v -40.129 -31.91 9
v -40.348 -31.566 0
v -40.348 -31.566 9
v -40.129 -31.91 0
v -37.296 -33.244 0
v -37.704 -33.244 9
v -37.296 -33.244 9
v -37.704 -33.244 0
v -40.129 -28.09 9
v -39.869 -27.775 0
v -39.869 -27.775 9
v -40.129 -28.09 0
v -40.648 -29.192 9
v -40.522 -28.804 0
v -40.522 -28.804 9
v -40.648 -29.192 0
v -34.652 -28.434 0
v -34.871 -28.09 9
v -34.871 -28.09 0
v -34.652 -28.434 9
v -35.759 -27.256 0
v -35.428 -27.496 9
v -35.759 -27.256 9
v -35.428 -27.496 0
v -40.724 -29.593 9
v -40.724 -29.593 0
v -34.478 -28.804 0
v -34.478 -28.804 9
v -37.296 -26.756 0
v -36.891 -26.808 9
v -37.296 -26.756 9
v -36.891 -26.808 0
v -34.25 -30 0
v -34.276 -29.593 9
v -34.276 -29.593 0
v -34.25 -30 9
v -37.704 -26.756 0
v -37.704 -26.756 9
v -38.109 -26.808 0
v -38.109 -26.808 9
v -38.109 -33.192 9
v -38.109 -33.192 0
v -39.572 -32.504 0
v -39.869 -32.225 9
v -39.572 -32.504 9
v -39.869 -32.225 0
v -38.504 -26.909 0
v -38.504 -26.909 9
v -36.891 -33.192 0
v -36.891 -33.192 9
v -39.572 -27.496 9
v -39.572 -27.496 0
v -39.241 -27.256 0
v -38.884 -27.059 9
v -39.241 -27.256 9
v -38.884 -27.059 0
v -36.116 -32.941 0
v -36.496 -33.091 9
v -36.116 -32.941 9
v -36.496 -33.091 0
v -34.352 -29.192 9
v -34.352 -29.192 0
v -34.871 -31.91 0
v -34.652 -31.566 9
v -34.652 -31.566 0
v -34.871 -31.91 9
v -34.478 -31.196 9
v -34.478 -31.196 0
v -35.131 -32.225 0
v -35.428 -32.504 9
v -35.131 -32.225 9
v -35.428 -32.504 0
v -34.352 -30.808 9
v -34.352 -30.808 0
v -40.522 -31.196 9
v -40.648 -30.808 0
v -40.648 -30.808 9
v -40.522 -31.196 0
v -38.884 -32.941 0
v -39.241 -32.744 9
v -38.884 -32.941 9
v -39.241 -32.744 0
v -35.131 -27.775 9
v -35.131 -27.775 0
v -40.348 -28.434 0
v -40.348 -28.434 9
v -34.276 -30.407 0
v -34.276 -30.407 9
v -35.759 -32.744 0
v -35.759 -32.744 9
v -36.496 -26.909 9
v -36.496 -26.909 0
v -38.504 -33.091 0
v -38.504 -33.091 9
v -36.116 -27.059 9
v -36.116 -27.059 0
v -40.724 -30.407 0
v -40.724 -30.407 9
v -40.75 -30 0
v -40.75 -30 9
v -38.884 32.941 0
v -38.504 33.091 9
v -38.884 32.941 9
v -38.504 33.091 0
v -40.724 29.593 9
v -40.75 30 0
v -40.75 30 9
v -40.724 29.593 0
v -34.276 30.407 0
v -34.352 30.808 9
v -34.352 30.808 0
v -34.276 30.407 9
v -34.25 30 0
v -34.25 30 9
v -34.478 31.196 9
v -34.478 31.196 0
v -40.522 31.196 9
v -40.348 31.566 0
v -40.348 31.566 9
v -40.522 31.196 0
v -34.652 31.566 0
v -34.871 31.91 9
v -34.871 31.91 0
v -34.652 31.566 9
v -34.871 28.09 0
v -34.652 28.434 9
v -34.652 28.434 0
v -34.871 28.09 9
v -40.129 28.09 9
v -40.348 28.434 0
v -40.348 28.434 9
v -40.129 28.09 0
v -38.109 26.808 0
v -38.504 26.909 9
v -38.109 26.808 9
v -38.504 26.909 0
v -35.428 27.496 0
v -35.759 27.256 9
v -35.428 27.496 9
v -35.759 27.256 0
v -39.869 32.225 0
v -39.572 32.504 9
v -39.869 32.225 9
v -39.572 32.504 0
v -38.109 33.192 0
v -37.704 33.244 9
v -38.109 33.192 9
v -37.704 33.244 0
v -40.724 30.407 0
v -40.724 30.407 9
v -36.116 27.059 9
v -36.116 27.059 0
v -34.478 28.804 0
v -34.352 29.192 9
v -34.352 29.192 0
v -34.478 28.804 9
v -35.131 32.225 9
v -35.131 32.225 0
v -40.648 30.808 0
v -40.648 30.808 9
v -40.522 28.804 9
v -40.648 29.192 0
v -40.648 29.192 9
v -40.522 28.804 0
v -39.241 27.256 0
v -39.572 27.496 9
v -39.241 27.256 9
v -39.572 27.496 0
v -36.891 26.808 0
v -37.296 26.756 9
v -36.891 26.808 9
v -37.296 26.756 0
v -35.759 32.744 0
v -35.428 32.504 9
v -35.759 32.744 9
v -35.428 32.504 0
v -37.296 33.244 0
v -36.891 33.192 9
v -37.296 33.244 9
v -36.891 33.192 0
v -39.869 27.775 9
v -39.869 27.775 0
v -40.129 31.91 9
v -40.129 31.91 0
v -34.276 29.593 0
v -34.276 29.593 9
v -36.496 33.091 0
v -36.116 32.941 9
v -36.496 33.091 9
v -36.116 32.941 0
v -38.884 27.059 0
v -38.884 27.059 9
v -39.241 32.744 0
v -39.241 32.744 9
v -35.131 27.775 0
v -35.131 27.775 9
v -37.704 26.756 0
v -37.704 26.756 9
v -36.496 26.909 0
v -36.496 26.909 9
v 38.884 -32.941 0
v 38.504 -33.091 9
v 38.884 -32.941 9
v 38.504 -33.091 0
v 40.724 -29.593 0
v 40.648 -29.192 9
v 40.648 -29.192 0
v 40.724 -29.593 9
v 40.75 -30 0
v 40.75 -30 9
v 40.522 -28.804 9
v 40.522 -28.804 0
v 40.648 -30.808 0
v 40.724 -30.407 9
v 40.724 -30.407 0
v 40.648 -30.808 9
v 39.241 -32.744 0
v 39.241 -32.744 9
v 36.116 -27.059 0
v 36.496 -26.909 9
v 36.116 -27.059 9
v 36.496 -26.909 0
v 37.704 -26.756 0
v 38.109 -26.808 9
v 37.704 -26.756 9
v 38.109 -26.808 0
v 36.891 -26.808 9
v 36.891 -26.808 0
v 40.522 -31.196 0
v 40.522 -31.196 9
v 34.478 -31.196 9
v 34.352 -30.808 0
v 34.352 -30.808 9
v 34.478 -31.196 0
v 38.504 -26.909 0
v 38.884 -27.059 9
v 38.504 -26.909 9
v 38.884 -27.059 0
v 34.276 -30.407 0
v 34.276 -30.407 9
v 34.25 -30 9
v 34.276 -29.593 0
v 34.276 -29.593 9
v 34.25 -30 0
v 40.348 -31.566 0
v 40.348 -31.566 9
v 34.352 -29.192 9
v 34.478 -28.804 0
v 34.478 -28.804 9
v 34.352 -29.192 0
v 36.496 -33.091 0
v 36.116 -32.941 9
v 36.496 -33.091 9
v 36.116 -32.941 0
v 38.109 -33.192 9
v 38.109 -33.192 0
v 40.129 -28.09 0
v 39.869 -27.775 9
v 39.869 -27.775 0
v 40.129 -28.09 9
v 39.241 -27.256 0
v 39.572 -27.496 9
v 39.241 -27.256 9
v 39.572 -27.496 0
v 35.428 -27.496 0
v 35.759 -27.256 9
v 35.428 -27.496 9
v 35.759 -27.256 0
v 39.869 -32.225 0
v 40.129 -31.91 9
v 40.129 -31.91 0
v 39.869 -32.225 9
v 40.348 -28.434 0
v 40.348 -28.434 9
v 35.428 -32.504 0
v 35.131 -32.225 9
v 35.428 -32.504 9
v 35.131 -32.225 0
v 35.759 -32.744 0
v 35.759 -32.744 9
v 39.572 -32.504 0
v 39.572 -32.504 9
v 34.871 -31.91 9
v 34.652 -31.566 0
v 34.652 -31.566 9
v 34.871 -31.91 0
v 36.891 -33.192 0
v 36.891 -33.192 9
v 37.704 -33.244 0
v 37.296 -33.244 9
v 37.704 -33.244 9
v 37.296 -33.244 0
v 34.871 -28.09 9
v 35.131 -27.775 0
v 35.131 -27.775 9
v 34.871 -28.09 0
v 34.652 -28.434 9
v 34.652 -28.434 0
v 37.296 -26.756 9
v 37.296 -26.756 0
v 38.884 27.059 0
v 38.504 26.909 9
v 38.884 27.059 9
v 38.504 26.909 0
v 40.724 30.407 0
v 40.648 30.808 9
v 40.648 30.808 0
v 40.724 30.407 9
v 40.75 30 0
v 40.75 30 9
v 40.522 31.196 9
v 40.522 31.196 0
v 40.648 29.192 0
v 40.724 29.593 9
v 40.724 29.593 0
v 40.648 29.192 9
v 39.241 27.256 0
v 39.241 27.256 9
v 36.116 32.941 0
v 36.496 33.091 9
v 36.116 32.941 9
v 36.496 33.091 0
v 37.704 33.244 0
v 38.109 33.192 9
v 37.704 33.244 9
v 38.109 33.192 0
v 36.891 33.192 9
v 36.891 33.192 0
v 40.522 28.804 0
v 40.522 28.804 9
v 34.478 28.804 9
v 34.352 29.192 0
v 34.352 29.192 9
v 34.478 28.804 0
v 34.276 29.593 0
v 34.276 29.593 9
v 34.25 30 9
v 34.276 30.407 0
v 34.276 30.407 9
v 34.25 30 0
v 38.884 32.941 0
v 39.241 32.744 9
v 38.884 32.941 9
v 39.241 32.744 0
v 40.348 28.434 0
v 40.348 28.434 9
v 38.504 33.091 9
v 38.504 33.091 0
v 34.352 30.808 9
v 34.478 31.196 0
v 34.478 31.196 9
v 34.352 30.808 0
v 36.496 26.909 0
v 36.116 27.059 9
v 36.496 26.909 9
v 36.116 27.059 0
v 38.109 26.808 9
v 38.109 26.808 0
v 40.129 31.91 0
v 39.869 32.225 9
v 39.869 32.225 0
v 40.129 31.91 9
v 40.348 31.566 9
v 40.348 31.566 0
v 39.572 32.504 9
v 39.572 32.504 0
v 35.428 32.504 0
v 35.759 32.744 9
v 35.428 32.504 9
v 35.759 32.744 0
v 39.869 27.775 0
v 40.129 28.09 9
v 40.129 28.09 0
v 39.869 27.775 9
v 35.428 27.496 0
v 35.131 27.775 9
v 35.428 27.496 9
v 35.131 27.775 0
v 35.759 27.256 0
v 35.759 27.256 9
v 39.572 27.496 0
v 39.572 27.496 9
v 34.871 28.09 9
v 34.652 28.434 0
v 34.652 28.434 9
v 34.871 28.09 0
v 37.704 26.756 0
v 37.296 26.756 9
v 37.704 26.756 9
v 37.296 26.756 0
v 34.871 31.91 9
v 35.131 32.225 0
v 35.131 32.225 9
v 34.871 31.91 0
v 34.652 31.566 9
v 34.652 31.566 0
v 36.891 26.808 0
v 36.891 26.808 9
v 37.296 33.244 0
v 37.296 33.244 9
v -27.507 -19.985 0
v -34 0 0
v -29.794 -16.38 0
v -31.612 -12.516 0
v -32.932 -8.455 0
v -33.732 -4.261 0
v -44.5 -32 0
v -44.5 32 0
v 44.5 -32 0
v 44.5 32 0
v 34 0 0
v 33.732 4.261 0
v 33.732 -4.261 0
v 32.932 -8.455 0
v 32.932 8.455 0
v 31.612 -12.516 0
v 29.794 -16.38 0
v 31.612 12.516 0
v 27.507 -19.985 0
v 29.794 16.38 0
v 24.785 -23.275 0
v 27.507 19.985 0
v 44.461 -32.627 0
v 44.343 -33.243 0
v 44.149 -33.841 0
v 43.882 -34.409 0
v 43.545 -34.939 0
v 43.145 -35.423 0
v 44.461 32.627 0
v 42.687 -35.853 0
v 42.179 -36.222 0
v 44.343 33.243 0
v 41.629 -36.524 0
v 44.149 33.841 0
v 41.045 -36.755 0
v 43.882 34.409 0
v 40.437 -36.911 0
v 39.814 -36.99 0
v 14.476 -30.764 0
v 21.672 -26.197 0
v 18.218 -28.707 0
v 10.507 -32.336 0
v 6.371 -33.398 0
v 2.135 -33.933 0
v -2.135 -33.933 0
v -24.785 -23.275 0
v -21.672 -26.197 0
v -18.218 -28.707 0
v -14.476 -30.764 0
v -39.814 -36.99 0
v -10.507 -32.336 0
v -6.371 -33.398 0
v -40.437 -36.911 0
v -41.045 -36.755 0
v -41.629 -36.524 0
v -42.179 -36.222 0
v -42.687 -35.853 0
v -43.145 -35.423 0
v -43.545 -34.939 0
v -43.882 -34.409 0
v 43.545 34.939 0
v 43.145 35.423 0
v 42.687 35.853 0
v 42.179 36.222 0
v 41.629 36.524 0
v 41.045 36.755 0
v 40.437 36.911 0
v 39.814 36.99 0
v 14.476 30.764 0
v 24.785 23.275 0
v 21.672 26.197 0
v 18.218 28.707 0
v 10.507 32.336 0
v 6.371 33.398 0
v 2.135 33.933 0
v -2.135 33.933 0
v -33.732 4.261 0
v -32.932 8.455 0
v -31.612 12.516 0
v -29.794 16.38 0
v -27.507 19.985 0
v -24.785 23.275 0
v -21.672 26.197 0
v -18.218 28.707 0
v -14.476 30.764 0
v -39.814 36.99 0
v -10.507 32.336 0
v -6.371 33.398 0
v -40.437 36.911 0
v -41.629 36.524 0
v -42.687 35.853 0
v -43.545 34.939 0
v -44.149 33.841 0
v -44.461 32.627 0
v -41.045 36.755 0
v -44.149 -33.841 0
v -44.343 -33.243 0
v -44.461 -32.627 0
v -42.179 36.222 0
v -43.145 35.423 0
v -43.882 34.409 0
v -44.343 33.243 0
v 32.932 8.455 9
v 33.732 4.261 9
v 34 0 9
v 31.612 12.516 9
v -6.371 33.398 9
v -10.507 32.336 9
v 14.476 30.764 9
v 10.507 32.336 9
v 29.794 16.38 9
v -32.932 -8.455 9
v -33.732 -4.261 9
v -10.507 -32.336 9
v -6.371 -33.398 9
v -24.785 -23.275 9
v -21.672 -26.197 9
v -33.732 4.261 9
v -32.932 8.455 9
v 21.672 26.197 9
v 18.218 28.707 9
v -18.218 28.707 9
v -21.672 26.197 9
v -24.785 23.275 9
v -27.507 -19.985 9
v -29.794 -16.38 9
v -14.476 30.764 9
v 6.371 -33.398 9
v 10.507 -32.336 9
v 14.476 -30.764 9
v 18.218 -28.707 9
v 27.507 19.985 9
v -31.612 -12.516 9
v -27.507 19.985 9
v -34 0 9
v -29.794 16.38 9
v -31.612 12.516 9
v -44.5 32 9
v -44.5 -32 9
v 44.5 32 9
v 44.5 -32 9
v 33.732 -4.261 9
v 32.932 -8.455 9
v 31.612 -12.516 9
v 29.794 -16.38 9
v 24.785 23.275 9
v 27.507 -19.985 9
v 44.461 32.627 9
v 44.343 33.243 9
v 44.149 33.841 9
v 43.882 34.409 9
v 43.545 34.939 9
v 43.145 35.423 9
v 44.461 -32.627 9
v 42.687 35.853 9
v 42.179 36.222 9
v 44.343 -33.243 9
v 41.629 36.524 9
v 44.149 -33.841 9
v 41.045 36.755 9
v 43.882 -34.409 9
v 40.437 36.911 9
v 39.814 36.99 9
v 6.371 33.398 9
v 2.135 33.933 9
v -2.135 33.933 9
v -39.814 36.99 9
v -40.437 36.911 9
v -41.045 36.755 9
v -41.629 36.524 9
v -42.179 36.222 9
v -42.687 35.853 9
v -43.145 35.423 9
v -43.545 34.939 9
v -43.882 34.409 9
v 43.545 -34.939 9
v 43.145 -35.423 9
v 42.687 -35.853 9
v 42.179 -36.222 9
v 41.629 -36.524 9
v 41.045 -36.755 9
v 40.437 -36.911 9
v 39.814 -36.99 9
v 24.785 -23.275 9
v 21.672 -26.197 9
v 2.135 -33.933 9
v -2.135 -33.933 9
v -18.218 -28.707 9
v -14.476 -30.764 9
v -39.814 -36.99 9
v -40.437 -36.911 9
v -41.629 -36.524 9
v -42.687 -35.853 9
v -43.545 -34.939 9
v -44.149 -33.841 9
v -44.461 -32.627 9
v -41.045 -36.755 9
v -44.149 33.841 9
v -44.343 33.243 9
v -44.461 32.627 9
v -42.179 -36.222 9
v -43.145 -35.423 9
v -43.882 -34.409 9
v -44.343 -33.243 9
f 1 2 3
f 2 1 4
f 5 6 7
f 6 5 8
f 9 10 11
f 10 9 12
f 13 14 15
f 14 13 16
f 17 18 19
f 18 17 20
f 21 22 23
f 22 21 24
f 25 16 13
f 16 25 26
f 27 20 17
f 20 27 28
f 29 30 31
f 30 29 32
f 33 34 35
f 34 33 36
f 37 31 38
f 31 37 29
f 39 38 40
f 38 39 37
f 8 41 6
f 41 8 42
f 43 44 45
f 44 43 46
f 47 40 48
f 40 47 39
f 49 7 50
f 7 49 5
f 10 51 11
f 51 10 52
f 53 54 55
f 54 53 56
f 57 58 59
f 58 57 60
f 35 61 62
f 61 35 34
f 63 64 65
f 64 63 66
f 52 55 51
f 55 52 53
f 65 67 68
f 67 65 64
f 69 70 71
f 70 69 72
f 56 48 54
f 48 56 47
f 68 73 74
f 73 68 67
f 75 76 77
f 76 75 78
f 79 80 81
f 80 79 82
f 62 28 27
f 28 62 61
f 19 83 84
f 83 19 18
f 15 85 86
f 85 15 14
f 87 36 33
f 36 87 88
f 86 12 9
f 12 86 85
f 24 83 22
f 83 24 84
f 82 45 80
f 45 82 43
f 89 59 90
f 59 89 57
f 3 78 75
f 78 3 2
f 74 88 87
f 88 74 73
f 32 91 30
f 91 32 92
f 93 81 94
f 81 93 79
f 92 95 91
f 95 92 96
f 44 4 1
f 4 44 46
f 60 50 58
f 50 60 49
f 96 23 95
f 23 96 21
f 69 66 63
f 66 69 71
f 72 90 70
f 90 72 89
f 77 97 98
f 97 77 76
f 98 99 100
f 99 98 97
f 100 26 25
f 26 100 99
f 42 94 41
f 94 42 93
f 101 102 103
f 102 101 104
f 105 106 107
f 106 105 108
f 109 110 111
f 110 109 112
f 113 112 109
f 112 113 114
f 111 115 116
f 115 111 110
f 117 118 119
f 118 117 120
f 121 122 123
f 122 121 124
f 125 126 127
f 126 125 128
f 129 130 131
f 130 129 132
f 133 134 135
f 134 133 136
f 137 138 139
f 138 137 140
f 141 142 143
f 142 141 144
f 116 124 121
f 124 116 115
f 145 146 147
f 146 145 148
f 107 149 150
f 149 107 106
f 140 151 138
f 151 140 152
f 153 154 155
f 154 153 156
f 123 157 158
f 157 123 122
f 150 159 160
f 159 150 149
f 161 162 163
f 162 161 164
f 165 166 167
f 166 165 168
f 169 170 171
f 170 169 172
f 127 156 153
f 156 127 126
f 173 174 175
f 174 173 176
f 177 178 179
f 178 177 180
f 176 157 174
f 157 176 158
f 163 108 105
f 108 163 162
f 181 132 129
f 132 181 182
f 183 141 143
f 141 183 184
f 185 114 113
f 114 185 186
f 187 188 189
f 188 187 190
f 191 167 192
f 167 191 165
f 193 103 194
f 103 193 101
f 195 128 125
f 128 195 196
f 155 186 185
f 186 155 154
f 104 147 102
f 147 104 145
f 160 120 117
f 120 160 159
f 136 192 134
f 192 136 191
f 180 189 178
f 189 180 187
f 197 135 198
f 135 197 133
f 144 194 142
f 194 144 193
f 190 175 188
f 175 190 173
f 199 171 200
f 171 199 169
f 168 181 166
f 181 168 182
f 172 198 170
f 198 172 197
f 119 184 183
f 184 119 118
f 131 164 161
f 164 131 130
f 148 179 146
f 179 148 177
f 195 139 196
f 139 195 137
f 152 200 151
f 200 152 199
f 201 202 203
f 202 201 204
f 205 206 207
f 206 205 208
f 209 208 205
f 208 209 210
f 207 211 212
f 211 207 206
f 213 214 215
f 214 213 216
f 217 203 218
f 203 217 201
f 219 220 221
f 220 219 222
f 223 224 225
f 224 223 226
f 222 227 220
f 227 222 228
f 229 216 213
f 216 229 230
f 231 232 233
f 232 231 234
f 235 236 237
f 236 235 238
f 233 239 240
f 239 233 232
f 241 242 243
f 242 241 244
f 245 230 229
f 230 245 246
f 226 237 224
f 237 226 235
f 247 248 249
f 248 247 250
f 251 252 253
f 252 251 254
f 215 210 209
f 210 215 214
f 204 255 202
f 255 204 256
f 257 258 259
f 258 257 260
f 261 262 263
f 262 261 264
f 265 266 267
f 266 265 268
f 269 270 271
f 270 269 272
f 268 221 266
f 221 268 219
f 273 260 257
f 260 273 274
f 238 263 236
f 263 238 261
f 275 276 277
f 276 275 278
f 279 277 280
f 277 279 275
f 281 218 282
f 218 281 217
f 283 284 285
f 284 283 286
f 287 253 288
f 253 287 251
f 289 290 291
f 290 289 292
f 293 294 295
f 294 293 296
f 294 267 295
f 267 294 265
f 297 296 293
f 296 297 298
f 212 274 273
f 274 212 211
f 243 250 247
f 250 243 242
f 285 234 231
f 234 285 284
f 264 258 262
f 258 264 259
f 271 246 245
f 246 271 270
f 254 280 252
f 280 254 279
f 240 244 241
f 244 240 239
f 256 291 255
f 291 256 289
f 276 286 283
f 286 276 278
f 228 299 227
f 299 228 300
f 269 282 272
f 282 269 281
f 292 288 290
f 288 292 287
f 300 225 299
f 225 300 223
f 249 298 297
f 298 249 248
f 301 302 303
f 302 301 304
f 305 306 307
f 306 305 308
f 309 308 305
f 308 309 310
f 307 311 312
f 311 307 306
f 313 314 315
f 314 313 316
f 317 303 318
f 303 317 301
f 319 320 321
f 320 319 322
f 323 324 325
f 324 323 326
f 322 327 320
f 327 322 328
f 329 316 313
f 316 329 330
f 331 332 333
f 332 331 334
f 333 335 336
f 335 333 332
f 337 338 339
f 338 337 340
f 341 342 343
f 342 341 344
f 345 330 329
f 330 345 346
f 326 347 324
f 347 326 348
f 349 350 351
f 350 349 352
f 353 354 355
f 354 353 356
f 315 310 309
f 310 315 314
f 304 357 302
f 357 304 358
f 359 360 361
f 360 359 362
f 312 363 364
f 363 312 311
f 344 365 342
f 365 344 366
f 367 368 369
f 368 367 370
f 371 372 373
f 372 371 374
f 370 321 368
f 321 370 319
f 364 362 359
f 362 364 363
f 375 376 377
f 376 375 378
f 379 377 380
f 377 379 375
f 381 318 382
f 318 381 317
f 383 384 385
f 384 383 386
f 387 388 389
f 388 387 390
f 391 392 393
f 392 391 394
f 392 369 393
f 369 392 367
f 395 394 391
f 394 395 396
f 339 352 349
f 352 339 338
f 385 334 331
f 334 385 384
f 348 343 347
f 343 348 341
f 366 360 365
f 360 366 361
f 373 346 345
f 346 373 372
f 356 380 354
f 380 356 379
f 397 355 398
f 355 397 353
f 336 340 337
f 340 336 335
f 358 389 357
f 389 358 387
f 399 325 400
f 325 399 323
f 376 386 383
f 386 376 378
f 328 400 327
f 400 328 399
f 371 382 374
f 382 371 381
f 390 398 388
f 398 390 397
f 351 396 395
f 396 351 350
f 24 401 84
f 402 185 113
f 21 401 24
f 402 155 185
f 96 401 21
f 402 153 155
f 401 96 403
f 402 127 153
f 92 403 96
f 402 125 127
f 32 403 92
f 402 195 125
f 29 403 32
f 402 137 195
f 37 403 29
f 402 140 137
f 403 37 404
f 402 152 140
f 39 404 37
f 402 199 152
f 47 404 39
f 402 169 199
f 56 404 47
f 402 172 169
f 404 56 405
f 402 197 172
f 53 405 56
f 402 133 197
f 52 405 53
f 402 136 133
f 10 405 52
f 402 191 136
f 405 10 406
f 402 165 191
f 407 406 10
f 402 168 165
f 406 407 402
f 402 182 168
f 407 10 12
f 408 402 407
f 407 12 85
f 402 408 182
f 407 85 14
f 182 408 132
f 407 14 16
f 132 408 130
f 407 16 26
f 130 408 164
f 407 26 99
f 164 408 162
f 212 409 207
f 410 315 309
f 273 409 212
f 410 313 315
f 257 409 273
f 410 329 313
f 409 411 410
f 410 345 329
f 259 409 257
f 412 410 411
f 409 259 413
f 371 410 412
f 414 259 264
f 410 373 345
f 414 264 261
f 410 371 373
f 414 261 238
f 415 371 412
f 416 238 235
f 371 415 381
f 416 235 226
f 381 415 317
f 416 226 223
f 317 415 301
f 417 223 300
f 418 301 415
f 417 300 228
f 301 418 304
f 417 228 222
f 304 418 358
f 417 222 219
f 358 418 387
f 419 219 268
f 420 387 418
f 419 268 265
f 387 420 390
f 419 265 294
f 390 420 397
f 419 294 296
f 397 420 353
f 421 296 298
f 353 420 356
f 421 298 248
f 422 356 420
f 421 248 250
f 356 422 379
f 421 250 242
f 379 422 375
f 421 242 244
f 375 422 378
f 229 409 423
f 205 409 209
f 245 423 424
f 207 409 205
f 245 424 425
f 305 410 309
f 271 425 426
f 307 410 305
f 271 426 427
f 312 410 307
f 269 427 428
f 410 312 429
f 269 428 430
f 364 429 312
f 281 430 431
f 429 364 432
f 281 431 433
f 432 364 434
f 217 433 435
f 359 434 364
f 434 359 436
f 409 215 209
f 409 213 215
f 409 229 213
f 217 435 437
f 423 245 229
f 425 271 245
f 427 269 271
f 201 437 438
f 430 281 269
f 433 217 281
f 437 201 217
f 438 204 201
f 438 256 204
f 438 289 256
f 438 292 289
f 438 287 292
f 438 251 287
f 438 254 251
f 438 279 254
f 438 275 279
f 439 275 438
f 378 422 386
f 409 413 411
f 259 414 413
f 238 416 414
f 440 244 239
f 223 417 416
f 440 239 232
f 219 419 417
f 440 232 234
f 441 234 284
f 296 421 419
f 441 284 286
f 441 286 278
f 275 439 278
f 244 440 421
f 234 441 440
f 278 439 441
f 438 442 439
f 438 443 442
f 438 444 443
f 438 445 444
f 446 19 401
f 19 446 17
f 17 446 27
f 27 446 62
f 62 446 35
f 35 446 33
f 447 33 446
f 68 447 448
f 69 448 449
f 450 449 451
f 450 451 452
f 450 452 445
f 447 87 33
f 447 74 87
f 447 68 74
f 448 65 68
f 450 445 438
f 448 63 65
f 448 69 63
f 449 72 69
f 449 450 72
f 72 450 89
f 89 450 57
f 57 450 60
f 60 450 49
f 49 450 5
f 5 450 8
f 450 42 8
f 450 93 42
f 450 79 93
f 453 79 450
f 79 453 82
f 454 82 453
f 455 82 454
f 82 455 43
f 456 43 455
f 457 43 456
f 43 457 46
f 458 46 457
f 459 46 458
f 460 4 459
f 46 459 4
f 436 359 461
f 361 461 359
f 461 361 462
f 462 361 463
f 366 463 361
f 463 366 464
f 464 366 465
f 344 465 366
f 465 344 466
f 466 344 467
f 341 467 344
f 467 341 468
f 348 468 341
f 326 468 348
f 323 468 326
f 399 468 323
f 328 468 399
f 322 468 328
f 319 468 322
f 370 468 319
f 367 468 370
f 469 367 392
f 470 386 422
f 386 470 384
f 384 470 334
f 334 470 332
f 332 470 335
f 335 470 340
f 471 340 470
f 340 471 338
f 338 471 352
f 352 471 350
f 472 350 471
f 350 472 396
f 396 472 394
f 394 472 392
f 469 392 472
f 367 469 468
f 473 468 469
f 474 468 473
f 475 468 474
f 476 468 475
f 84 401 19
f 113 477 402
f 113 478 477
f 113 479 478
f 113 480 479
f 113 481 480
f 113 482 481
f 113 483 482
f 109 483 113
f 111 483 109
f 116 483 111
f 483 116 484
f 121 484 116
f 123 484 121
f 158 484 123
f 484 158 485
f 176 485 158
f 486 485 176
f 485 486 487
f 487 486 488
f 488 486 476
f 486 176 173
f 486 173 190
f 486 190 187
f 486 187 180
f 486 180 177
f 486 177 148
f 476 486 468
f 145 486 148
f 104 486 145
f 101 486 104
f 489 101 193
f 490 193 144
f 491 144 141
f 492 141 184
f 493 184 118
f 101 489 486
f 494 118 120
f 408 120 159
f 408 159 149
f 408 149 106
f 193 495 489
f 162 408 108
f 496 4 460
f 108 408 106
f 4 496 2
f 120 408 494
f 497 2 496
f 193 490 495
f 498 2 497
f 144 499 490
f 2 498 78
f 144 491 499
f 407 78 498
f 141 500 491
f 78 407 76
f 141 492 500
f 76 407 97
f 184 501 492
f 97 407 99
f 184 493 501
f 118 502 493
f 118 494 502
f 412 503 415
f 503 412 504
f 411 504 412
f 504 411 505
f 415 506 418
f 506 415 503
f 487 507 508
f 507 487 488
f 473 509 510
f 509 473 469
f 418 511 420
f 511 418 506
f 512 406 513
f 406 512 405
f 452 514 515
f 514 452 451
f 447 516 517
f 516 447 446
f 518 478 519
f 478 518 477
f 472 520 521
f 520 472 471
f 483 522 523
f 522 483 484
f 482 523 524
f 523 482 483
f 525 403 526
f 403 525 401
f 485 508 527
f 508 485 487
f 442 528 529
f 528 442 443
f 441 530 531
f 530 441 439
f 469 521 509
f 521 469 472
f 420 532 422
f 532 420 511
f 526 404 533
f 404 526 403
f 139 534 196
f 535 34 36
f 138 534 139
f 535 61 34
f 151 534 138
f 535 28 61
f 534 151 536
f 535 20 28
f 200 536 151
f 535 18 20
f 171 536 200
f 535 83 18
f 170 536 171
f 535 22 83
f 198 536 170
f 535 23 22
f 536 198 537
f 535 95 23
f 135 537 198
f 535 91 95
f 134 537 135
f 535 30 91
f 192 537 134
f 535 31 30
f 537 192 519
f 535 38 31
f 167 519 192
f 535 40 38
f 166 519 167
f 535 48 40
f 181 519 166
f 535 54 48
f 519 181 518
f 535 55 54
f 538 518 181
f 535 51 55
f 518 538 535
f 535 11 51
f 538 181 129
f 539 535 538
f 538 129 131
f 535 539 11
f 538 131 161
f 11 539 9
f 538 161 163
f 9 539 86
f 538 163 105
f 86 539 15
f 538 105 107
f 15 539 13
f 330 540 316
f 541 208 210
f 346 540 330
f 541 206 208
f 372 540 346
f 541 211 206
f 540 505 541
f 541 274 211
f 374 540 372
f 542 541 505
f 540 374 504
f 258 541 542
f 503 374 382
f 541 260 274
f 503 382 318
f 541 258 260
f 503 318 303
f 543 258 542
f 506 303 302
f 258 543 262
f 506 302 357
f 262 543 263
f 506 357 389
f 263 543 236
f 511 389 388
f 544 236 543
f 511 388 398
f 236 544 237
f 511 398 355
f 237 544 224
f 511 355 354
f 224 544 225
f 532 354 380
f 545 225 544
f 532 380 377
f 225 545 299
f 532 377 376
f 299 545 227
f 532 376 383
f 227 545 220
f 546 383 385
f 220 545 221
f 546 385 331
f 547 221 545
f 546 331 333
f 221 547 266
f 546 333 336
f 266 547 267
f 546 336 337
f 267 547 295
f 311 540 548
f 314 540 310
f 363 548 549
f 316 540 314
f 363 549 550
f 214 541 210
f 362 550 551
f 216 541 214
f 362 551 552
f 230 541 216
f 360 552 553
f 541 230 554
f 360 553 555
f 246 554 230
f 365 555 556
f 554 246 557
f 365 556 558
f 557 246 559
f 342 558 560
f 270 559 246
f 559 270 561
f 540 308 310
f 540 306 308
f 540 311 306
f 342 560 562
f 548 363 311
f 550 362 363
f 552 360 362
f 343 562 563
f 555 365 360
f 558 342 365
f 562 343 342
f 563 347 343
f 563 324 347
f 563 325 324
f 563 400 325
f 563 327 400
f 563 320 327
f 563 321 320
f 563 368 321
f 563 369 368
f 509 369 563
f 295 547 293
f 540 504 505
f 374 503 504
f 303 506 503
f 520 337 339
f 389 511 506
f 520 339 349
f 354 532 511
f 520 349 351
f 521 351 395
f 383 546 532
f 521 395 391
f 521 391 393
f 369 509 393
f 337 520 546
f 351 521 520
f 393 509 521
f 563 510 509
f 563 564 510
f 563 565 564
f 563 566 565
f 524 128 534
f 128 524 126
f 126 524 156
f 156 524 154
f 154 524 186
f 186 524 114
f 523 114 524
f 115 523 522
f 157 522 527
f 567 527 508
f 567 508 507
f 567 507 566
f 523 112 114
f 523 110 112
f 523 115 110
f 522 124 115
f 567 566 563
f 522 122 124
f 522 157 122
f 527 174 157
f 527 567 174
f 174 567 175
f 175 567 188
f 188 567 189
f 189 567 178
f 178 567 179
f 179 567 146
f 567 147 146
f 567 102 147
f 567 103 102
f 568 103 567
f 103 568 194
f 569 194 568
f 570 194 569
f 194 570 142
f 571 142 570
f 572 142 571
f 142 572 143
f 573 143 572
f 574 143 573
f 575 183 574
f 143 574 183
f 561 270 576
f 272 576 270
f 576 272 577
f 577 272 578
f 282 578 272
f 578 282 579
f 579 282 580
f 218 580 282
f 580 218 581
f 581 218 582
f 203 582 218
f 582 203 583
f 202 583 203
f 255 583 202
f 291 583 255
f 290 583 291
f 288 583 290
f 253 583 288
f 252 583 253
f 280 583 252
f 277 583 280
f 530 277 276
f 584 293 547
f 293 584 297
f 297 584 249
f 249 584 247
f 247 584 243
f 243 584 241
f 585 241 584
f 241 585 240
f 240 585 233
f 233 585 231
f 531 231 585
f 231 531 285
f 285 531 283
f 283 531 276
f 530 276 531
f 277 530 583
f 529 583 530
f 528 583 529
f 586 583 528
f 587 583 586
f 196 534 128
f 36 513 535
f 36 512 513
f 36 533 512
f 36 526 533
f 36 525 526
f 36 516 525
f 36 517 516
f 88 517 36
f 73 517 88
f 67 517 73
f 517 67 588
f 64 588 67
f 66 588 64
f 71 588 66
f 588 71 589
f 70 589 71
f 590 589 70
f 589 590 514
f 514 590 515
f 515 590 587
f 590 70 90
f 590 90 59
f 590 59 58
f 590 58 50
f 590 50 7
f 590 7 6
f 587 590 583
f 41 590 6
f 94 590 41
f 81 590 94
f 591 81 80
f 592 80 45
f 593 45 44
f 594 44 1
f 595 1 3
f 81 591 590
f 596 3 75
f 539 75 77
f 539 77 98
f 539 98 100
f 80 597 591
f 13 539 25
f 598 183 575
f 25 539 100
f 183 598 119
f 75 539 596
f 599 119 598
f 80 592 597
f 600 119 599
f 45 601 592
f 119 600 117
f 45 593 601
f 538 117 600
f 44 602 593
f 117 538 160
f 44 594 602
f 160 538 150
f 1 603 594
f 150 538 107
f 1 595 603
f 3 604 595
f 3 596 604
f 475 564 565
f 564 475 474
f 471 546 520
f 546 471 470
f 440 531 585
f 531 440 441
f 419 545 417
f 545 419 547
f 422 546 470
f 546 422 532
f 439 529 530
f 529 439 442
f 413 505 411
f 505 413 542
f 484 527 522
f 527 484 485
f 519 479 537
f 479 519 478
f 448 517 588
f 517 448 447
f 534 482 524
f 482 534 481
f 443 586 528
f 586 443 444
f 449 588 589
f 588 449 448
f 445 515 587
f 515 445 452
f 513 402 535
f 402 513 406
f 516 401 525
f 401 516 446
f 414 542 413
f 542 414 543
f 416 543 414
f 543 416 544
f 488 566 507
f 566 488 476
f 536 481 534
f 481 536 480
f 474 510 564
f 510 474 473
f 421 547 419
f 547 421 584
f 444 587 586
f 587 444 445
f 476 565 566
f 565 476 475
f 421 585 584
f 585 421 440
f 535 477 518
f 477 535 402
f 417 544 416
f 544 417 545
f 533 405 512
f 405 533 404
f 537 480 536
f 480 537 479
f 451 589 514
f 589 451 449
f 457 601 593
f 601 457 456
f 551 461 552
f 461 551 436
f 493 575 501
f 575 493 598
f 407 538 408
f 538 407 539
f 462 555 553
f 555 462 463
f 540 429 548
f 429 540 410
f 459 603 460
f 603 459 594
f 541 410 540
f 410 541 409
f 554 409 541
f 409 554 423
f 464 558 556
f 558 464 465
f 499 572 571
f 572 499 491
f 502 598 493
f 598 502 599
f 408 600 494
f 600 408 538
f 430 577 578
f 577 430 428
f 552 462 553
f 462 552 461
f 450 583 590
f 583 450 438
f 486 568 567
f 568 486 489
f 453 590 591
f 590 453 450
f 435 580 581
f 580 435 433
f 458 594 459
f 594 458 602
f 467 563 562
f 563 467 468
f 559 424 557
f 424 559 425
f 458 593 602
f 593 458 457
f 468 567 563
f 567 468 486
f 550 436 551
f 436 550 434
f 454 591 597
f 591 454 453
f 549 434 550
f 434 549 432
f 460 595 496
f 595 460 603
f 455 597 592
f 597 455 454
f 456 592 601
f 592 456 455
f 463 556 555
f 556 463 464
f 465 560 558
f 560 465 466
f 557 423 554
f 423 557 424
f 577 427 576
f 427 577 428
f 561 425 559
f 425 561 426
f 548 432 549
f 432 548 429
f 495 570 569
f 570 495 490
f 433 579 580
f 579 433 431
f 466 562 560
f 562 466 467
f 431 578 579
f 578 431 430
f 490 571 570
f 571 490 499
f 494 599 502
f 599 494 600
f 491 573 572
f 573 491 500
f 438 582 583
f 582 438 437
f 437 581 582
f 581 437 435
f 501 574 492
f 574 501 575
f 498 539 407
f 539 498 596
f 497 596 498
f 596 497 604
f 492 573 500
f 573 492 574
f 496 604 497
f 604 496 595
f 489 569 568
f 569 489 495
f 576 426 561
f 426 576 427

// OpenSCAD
$fn = 50;


difference() {
	union() {
		hull() {
			translate(v = [-39.5000000000, 32.0000000000, 0]) {
				cylinder(h = 9, r = 5);
			}
			translate(v = [39.5000000000, 32.0000000000, 0]) {
				cylinder(h = 9, r = 5);
			}
			translate(v = [-39.5000000000, -32.0000000000, 0]) {
				cylinder(h = 9, r = 5);
			}
			translate(v = [39.5000000000, -32.0000000000, 0]) {
				cylinder(h = 9, r = 5);
			}
		}
	}
	union() {
		#translate(v = [-37.5000000000, -30.0000000000, -100.0000000000]) {
			cylinder(h = 200, r = 3.2500000000);
		}
		#translate(v = [-37.5000000000, 30.0000000000, -100.0000000000]) {
			cylinder(h = 200, r = 3.2500000000);
		}
		#translate(v = [37.5000000000, -30.0000000000, -100.0000000000]) {
			cylinder(h = 200, r = 3.2500000000);
		}
		#translate(v = [37.5000000000, 30.0000000000, -100.0000000000]) {
			cylinder(h = 200, r = 3.2500000000);
		}
		#cylinder(h = 9, r = 34.0000000000);
	}
}
